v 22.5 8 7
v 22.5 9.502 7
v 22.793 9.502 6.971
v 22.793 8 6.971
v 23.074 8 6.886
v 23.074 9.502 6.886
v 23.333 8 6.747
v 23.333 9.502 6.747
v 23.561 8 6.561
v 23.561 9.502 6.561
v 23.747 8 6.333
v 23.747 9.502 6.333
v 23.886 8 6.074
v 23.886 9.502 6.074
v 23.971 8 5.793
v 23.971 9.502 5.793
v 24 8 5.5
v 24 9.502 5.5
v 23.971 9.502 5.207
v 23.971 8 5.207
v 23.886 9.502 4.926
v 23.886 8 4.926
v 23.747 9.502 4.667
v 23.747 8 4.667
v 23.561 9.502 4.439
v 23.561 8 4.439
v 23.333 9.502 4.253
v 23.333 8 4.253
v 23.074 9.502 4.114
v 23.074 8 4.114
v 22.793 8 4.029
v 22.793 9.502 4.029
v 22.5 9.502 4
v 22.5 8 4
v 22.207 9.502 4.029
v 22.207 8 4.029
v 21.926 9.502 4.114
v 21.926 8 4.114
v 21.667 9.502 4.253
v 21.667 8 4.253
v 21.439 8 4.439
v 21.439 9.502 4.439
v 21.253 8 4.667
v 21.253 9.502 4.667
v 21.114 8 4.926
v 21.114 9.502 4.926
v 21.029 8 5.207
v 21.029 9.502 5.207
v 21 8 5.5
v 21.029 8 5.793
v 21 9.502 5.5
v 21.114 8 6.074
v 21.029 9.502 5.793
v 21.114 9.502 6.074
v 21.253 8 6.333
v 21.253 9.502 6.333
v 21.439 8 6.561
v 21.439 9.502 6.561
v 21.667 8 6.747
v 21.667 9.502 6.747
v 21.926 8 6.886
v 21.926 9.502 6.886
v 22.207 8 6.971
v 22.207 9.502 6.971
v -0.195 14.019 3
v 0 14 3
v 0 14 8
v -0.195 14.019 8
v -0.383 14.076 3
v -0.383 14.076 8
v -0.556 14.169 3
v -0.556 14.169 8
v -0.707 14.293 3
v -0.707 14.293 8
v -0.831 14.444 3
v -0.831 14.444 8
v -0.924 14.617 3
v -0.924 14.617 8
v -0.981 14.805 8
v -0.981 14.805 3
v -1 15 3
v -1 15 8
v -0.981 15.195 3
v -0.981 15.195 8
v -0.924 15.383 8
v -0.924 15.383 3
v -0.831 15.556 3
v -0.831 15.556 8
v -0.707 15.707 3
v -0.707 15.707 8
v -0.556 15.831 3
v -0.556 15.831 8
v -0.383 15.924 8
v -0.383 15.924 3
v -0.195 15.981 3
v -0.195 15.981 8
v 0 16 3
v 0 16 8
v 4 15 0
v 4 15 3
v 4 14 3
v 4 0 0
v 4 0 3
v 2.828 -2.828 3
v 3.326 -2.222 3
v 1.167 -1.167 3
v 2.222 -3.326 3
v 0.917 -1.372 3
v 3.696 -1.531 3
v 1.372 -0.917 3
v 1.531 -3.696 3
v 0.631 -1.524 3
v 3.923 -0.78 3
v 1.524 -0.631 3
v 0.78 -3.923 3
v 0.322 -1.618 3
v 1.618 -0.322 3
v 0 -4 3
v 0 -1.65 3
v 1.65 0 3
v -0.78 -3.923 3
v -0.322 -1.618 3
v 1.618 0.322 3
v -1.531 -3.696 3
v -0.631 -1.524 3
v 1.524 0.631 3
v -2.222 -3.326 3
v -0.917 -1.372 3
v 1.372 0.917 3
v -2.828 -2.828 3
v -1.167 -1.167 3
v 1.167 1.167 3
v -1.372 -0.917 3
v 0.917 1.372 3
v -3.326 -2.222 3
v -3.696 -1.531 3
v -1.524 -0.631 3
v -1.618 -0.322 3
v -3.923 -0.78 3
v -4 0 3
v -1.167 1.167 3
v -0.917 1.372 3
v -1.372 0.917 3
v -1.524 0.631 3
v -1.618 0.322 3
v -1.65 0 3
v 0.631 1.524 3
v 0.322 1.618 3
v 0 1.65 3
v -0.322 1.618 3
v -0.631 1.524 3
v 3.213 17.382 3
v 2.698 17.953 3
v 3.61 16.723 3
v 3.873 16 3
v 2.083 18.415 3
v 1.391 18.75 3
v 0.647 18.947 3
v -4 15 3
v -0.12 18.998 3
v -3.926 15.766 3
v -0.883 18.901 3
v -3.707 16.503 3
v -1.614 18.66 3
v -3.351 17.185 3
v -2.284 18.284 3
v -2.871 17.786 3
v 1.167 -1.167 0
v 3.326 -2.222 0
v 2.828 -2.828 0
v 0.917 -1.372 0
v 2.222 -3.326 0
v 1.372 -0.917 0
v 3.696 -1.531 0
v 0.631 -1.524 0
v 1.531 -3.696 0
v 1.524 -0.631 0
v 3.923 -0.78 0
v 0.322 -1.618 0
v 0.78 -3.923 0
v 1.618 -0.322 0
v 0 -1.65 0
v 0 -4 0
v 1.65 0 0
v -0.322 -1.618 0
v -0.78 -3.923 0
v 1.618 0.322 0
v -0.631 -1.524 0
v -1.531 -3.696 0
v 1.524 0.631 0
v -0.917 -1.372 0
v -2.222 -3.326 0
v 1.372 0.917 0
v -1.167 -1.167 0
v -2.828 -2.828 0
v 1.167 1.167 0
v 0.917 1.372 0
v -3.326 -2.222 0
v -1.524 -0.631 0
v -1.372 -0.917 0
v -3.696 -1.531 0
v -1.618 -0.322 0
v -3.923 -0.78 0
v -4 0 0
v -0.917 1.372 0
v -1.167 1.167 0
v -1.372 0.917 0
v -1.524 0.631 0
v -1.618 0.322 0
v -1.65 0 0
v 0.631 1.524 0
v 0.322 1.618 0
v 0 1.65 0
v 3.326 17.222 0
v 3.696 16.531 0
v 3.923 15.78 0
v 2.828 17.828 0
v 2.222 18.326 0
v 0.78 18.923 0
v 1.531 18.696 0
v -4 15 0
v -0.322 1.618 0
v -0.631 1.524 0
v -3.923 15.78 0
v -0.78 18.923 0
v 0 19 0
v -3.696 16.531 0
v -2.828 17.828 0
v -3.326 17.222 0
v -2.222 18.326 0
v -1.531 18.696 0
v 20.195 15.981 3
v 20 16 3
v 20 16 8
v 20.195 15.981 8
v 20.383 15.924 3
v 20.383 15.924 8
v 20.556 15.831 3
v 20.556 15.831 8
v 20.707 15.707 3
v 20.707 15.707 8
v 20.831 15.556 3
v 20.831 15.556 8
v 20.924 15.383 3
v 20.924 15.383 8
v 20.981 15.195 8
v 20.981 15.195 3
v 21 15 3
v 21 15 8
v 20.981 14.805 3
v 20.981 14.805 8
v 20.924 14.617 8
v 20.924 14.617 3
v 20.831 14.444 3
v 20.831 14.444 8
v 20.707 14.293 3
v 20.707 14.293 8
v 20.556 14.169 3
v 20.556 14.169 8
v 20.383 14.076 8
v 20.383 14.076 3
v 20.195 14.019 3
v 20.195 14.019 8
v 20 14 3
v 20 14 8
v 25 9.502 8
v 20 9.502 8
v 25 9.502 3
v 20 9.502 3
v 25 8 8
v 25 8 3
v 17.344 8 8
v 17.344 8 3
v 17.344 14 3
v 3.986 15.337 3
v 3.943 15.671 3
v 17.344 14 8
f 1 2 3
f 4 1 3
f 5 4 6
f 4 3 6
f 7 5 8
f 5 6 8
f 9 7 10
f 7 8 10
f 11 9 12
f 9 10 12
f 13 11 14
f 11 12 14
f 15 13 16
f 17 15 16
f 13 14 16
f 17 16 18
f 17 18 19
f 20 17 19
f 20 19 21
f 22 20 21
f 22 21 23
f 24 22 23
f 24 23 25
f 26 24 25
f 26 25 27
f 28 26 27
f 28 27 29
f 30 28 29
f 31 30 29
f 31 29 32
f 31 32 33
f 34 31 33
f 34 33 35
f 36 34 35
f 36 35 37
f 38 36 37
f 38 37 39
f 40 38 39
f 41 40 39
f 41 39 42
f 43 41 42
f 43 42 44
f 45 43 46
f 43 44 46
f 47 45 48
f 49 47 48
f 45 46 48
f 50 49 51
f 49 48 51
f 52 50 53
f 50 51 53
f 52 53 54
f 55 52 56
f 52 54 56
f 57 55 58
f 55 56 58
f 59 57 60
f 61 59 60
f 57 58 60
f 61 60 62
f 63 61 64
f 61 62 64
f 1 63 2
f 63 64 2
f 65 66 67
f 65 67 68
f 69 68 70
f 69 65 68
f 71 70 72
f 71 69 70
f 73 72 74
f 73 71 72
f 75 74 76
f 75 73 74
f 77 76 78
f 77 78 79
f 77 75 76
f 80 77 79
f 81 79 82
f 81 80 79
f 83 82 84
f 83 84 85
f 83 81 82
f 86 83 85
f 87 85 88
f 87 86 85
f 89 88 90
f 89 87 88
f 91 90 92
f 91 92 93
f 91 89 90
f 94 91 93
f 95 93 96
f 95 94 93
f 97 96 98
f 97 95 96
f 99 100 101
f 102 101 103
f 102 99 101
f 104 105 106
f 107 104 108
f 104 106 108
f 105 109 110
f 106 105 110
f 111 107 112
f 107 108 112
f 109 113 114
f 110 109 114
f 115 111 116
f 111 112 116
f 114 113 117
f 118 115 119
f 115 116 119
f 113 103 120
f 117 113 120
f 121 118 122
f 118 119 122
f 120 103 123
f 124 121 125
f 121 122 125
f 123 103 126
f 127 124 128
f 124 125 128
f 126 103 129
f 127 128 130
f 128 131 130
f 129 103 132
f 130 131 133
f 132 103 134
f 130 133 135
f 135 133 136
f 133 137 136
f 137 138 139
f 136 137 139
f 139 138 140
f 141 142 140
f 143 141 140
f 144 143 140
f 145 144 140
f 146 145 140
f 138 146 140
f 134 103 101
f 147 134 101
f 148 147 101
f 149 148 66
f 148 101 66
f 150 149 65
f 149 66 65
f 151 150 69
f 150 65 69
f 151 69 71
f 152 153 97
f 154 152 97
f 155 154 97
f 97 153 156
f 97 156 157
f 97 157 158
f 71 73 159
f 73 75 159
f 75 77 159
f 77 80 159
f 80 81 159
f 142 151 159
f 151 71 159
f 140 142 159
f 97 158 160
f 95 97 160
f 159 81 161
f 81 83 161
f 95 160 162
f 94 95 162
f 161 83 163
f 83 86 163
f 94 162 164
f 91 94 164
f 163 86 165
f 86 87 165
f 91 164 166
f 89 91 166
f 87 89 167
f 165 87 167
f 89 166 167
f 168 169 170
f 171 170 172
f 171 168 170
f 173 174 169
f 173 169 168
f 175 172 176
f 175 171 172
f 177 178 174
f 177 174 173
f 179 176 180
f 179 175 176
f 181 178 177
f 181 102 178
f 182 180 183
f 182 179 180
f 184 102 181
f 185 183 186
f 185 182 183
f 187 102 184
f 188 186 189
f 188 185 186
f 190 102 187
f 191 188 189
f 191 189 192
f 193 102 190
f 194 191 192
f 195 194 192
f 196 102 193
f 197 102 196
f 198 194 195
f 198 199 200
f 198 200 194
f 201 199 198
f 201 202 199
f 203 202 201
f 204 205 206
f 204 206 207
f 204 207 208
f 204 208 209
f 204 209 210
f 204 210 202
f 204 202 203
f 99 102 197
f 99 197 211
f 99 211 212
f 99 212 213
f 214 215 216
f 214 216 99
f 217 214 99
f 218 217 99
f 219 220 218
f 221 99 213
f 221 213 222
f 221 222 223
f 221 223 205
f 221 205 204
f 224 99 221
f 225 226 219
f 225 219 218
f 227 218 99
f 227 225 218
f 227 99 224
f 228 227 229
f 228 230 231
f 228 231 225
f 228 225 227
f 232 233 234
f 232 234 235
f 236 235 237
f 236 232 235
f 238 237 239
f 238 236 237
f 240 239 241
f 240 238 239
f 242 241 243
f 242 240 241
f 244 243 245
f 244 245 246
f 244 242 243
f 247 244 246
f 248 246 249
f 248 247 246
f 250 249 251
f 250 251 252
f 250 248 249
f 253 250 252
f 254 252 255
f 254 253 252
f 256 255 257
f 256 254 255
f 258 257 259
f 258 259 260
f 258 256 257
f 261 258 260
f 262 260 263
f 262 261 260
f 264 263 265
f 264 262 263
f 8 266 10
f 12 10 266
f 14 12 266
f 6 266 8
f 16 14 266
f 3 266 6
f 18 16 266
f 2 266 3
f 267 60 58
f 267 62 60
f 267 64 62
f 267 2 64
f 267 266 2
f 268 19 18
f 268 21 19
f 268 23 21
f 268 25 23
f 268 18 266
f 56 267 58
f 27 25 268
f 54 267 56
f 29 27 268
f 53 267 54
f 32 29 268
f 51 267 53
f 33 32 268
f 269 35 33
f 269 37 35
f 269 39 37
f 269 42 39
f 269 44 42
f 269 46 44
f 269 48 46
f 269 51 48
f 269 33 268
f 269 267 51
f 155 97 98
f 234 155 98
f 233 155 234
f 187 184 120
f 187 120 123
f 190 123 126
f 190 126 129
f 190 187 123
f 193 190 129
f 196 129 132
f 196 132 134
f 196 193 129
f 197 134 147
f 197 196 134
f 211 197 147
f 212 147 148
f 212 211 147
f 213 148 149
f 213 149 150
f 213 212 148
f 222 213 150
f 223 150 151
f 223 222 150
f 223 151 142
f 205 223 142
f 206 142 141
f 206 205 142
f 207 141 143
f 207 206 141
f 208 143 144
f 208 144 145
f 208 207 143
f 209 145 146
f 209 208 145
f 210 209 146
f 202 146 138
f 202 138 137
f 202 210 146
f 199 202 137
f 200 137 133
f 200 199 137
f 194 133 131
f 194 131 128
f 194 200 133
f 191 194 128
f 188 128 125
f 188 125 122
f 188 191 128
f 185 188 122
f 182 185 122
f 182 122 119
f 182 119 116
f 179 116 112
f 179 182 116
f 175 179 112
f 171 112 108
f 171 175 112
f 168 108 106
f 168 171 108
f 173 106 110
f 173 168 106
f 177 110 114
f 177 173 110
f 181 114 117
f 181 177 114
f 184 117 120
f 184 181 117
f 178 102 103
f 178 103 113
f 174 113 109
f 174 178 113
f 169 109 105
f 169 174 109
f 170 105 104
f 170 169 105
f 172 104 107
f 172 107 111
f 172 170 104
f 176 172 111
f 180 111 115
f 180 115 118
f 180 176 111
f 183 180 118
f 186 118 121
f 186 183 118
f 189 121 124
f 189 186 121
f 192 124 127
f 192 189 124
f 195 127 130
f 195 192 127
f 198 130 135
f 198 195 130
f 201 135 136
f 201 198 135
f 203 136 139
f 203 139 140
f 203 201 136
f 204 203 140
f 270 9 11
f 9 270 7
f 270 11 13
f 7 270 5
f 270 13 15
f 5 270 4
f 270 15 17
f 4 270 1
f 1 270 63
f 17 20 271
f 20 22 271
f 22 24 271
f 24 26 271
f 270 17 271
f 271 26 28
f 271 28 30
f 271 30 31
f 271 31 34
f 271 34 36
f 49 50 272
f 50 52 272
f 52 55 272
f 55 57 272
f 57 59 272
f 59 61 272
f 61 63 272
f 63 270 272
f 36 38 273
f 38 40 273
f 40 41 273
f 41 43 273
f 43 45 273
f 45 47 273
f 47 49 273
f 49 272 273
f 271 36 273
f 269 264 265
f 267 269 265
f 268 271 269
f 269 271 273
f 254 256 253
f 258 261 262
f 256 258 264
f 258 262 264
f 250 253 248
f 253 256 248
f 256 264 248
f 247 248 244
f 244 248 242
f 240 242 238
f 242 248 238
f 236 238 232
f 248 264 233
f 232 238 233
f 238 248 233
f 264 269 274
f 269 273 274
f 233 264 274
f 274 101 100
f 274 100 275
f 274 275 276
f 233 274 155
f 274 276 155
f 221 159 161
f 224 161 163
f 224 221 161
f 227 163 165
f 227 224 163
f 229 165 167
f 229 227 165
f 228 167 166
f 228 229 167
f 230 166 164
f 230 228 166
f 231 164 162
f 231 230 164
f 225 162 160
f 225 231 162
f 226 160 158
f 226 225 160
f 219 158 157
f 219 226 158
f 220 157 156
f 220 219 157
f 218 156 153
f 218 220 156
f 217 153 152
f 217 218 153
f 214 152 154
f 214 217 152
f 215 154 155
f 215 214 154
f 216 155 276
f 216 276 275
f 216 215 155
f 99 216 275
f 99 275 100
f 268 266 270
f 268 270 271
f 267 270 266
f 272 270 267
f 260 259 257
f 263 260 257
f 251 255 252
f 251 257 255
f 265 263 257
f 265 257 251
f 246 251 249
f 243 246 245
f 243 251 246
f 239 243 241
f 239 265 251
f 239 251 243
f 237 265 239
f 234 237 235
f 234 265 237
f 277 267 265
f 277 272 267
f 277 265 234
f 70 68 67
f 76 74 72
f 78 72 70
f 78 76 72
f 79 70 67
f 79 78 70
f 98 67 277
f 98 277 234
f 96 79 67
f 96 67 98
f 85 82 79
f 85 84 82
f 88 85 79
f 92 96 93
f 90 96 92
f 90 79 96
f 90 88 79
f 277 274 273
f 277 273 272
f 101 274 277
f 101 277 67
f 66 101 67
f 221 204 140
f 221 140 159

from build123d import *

# Parameters (mm, degrees)
SKETCH3_R           = 1.65
BOSS_EXTRUDE1_DEPTH = 3
BOSS_EXTRUDE2_DEPTH = 5
SKETCH11_W          = 2.655817679
SKETCH11_H          = 5
BOSS_EXTRUDE6_DEPTH = 6
SKETCH12_W          = 5
SKETCH12_H          = 1.502128234
BOSS_EXTRUDE7_DEPTH = 5
SKETCH13_R          = 1.5
CUT_EXTRUDE3_DEPTH  = 5


with BuildPart() as part:
    # Sketch3 → Boss-Extrude1 (new body)
    with BuildSketch(Plane.XY):
        with BuildLine():
            Line((-4, 0), (-4, 15))
            ThreePointArc((-4, 15), (0, 19), (4, 15))
            Line((4, 15), (4, 0))
            ThreePointArc((4, 0), (0, -4), (-4, 0))
        make_face()
        Circle(SKETCH3_R, mode=Mode.SUBTRACT)
    extrude(amount=BOSS_EXTRUDE1_DEPTH)

    # Sketch4 → Boss-Extrude2 (add)
    with BuildSketch(Plane.XY.offset(3)):
        with BuildLine():
            Line((0, 16), (20, 16))
            ThreePointArc((20, 16), (21, 15), (20, 14))
            Line((20, 14), (0, 14))
            ThreePointArc((0, 14), (-1, 15), (0, 16))
        make_face()
    extrude(amount=BOSS_EXTRUDE2_DEPTH)

    # Sketch11 → Boss-Extrude6 (add)
    with BuildSketch(Plane.XZ.offset(-14)):
        with Locations((18.672091161, 5.5)):
            Rectangle(SKETCH11_W, SKETCH11_H)
    extrude(amount=BOSS_EXTRUDE6_DEPTH)

    # Sketch12 → Boss-Extrude7 (add)
    with BuildSketch(Plane(origin=(20, 0, 0), x_dir=(0, 0, -1), z_dir=(1, 0, 0))):
        with Locations((-5.5, 8.751064117)):
            Rectangle(SKETCH12_W, SKETCH12_H)
    extrude(amount=BOSS_EXTRUDE7_DEPTH)

    # Sketch13 → Cut-Extrude3 (cut)
    with BuildSketch(Plane(origin=(0, 9.502128234, 0), x_dir=(1, 0, 0), z_dir=(0, 1, 0))):
        with Locations(Location((22.5, -5.5, 0), (0, 0, 270))):
            Circle(SKETCH13_R)
    extrude(amount=-CUT_EXTRUDE3_DEPTH, mode=Mode.SUBTRACT)


solid = part.part
